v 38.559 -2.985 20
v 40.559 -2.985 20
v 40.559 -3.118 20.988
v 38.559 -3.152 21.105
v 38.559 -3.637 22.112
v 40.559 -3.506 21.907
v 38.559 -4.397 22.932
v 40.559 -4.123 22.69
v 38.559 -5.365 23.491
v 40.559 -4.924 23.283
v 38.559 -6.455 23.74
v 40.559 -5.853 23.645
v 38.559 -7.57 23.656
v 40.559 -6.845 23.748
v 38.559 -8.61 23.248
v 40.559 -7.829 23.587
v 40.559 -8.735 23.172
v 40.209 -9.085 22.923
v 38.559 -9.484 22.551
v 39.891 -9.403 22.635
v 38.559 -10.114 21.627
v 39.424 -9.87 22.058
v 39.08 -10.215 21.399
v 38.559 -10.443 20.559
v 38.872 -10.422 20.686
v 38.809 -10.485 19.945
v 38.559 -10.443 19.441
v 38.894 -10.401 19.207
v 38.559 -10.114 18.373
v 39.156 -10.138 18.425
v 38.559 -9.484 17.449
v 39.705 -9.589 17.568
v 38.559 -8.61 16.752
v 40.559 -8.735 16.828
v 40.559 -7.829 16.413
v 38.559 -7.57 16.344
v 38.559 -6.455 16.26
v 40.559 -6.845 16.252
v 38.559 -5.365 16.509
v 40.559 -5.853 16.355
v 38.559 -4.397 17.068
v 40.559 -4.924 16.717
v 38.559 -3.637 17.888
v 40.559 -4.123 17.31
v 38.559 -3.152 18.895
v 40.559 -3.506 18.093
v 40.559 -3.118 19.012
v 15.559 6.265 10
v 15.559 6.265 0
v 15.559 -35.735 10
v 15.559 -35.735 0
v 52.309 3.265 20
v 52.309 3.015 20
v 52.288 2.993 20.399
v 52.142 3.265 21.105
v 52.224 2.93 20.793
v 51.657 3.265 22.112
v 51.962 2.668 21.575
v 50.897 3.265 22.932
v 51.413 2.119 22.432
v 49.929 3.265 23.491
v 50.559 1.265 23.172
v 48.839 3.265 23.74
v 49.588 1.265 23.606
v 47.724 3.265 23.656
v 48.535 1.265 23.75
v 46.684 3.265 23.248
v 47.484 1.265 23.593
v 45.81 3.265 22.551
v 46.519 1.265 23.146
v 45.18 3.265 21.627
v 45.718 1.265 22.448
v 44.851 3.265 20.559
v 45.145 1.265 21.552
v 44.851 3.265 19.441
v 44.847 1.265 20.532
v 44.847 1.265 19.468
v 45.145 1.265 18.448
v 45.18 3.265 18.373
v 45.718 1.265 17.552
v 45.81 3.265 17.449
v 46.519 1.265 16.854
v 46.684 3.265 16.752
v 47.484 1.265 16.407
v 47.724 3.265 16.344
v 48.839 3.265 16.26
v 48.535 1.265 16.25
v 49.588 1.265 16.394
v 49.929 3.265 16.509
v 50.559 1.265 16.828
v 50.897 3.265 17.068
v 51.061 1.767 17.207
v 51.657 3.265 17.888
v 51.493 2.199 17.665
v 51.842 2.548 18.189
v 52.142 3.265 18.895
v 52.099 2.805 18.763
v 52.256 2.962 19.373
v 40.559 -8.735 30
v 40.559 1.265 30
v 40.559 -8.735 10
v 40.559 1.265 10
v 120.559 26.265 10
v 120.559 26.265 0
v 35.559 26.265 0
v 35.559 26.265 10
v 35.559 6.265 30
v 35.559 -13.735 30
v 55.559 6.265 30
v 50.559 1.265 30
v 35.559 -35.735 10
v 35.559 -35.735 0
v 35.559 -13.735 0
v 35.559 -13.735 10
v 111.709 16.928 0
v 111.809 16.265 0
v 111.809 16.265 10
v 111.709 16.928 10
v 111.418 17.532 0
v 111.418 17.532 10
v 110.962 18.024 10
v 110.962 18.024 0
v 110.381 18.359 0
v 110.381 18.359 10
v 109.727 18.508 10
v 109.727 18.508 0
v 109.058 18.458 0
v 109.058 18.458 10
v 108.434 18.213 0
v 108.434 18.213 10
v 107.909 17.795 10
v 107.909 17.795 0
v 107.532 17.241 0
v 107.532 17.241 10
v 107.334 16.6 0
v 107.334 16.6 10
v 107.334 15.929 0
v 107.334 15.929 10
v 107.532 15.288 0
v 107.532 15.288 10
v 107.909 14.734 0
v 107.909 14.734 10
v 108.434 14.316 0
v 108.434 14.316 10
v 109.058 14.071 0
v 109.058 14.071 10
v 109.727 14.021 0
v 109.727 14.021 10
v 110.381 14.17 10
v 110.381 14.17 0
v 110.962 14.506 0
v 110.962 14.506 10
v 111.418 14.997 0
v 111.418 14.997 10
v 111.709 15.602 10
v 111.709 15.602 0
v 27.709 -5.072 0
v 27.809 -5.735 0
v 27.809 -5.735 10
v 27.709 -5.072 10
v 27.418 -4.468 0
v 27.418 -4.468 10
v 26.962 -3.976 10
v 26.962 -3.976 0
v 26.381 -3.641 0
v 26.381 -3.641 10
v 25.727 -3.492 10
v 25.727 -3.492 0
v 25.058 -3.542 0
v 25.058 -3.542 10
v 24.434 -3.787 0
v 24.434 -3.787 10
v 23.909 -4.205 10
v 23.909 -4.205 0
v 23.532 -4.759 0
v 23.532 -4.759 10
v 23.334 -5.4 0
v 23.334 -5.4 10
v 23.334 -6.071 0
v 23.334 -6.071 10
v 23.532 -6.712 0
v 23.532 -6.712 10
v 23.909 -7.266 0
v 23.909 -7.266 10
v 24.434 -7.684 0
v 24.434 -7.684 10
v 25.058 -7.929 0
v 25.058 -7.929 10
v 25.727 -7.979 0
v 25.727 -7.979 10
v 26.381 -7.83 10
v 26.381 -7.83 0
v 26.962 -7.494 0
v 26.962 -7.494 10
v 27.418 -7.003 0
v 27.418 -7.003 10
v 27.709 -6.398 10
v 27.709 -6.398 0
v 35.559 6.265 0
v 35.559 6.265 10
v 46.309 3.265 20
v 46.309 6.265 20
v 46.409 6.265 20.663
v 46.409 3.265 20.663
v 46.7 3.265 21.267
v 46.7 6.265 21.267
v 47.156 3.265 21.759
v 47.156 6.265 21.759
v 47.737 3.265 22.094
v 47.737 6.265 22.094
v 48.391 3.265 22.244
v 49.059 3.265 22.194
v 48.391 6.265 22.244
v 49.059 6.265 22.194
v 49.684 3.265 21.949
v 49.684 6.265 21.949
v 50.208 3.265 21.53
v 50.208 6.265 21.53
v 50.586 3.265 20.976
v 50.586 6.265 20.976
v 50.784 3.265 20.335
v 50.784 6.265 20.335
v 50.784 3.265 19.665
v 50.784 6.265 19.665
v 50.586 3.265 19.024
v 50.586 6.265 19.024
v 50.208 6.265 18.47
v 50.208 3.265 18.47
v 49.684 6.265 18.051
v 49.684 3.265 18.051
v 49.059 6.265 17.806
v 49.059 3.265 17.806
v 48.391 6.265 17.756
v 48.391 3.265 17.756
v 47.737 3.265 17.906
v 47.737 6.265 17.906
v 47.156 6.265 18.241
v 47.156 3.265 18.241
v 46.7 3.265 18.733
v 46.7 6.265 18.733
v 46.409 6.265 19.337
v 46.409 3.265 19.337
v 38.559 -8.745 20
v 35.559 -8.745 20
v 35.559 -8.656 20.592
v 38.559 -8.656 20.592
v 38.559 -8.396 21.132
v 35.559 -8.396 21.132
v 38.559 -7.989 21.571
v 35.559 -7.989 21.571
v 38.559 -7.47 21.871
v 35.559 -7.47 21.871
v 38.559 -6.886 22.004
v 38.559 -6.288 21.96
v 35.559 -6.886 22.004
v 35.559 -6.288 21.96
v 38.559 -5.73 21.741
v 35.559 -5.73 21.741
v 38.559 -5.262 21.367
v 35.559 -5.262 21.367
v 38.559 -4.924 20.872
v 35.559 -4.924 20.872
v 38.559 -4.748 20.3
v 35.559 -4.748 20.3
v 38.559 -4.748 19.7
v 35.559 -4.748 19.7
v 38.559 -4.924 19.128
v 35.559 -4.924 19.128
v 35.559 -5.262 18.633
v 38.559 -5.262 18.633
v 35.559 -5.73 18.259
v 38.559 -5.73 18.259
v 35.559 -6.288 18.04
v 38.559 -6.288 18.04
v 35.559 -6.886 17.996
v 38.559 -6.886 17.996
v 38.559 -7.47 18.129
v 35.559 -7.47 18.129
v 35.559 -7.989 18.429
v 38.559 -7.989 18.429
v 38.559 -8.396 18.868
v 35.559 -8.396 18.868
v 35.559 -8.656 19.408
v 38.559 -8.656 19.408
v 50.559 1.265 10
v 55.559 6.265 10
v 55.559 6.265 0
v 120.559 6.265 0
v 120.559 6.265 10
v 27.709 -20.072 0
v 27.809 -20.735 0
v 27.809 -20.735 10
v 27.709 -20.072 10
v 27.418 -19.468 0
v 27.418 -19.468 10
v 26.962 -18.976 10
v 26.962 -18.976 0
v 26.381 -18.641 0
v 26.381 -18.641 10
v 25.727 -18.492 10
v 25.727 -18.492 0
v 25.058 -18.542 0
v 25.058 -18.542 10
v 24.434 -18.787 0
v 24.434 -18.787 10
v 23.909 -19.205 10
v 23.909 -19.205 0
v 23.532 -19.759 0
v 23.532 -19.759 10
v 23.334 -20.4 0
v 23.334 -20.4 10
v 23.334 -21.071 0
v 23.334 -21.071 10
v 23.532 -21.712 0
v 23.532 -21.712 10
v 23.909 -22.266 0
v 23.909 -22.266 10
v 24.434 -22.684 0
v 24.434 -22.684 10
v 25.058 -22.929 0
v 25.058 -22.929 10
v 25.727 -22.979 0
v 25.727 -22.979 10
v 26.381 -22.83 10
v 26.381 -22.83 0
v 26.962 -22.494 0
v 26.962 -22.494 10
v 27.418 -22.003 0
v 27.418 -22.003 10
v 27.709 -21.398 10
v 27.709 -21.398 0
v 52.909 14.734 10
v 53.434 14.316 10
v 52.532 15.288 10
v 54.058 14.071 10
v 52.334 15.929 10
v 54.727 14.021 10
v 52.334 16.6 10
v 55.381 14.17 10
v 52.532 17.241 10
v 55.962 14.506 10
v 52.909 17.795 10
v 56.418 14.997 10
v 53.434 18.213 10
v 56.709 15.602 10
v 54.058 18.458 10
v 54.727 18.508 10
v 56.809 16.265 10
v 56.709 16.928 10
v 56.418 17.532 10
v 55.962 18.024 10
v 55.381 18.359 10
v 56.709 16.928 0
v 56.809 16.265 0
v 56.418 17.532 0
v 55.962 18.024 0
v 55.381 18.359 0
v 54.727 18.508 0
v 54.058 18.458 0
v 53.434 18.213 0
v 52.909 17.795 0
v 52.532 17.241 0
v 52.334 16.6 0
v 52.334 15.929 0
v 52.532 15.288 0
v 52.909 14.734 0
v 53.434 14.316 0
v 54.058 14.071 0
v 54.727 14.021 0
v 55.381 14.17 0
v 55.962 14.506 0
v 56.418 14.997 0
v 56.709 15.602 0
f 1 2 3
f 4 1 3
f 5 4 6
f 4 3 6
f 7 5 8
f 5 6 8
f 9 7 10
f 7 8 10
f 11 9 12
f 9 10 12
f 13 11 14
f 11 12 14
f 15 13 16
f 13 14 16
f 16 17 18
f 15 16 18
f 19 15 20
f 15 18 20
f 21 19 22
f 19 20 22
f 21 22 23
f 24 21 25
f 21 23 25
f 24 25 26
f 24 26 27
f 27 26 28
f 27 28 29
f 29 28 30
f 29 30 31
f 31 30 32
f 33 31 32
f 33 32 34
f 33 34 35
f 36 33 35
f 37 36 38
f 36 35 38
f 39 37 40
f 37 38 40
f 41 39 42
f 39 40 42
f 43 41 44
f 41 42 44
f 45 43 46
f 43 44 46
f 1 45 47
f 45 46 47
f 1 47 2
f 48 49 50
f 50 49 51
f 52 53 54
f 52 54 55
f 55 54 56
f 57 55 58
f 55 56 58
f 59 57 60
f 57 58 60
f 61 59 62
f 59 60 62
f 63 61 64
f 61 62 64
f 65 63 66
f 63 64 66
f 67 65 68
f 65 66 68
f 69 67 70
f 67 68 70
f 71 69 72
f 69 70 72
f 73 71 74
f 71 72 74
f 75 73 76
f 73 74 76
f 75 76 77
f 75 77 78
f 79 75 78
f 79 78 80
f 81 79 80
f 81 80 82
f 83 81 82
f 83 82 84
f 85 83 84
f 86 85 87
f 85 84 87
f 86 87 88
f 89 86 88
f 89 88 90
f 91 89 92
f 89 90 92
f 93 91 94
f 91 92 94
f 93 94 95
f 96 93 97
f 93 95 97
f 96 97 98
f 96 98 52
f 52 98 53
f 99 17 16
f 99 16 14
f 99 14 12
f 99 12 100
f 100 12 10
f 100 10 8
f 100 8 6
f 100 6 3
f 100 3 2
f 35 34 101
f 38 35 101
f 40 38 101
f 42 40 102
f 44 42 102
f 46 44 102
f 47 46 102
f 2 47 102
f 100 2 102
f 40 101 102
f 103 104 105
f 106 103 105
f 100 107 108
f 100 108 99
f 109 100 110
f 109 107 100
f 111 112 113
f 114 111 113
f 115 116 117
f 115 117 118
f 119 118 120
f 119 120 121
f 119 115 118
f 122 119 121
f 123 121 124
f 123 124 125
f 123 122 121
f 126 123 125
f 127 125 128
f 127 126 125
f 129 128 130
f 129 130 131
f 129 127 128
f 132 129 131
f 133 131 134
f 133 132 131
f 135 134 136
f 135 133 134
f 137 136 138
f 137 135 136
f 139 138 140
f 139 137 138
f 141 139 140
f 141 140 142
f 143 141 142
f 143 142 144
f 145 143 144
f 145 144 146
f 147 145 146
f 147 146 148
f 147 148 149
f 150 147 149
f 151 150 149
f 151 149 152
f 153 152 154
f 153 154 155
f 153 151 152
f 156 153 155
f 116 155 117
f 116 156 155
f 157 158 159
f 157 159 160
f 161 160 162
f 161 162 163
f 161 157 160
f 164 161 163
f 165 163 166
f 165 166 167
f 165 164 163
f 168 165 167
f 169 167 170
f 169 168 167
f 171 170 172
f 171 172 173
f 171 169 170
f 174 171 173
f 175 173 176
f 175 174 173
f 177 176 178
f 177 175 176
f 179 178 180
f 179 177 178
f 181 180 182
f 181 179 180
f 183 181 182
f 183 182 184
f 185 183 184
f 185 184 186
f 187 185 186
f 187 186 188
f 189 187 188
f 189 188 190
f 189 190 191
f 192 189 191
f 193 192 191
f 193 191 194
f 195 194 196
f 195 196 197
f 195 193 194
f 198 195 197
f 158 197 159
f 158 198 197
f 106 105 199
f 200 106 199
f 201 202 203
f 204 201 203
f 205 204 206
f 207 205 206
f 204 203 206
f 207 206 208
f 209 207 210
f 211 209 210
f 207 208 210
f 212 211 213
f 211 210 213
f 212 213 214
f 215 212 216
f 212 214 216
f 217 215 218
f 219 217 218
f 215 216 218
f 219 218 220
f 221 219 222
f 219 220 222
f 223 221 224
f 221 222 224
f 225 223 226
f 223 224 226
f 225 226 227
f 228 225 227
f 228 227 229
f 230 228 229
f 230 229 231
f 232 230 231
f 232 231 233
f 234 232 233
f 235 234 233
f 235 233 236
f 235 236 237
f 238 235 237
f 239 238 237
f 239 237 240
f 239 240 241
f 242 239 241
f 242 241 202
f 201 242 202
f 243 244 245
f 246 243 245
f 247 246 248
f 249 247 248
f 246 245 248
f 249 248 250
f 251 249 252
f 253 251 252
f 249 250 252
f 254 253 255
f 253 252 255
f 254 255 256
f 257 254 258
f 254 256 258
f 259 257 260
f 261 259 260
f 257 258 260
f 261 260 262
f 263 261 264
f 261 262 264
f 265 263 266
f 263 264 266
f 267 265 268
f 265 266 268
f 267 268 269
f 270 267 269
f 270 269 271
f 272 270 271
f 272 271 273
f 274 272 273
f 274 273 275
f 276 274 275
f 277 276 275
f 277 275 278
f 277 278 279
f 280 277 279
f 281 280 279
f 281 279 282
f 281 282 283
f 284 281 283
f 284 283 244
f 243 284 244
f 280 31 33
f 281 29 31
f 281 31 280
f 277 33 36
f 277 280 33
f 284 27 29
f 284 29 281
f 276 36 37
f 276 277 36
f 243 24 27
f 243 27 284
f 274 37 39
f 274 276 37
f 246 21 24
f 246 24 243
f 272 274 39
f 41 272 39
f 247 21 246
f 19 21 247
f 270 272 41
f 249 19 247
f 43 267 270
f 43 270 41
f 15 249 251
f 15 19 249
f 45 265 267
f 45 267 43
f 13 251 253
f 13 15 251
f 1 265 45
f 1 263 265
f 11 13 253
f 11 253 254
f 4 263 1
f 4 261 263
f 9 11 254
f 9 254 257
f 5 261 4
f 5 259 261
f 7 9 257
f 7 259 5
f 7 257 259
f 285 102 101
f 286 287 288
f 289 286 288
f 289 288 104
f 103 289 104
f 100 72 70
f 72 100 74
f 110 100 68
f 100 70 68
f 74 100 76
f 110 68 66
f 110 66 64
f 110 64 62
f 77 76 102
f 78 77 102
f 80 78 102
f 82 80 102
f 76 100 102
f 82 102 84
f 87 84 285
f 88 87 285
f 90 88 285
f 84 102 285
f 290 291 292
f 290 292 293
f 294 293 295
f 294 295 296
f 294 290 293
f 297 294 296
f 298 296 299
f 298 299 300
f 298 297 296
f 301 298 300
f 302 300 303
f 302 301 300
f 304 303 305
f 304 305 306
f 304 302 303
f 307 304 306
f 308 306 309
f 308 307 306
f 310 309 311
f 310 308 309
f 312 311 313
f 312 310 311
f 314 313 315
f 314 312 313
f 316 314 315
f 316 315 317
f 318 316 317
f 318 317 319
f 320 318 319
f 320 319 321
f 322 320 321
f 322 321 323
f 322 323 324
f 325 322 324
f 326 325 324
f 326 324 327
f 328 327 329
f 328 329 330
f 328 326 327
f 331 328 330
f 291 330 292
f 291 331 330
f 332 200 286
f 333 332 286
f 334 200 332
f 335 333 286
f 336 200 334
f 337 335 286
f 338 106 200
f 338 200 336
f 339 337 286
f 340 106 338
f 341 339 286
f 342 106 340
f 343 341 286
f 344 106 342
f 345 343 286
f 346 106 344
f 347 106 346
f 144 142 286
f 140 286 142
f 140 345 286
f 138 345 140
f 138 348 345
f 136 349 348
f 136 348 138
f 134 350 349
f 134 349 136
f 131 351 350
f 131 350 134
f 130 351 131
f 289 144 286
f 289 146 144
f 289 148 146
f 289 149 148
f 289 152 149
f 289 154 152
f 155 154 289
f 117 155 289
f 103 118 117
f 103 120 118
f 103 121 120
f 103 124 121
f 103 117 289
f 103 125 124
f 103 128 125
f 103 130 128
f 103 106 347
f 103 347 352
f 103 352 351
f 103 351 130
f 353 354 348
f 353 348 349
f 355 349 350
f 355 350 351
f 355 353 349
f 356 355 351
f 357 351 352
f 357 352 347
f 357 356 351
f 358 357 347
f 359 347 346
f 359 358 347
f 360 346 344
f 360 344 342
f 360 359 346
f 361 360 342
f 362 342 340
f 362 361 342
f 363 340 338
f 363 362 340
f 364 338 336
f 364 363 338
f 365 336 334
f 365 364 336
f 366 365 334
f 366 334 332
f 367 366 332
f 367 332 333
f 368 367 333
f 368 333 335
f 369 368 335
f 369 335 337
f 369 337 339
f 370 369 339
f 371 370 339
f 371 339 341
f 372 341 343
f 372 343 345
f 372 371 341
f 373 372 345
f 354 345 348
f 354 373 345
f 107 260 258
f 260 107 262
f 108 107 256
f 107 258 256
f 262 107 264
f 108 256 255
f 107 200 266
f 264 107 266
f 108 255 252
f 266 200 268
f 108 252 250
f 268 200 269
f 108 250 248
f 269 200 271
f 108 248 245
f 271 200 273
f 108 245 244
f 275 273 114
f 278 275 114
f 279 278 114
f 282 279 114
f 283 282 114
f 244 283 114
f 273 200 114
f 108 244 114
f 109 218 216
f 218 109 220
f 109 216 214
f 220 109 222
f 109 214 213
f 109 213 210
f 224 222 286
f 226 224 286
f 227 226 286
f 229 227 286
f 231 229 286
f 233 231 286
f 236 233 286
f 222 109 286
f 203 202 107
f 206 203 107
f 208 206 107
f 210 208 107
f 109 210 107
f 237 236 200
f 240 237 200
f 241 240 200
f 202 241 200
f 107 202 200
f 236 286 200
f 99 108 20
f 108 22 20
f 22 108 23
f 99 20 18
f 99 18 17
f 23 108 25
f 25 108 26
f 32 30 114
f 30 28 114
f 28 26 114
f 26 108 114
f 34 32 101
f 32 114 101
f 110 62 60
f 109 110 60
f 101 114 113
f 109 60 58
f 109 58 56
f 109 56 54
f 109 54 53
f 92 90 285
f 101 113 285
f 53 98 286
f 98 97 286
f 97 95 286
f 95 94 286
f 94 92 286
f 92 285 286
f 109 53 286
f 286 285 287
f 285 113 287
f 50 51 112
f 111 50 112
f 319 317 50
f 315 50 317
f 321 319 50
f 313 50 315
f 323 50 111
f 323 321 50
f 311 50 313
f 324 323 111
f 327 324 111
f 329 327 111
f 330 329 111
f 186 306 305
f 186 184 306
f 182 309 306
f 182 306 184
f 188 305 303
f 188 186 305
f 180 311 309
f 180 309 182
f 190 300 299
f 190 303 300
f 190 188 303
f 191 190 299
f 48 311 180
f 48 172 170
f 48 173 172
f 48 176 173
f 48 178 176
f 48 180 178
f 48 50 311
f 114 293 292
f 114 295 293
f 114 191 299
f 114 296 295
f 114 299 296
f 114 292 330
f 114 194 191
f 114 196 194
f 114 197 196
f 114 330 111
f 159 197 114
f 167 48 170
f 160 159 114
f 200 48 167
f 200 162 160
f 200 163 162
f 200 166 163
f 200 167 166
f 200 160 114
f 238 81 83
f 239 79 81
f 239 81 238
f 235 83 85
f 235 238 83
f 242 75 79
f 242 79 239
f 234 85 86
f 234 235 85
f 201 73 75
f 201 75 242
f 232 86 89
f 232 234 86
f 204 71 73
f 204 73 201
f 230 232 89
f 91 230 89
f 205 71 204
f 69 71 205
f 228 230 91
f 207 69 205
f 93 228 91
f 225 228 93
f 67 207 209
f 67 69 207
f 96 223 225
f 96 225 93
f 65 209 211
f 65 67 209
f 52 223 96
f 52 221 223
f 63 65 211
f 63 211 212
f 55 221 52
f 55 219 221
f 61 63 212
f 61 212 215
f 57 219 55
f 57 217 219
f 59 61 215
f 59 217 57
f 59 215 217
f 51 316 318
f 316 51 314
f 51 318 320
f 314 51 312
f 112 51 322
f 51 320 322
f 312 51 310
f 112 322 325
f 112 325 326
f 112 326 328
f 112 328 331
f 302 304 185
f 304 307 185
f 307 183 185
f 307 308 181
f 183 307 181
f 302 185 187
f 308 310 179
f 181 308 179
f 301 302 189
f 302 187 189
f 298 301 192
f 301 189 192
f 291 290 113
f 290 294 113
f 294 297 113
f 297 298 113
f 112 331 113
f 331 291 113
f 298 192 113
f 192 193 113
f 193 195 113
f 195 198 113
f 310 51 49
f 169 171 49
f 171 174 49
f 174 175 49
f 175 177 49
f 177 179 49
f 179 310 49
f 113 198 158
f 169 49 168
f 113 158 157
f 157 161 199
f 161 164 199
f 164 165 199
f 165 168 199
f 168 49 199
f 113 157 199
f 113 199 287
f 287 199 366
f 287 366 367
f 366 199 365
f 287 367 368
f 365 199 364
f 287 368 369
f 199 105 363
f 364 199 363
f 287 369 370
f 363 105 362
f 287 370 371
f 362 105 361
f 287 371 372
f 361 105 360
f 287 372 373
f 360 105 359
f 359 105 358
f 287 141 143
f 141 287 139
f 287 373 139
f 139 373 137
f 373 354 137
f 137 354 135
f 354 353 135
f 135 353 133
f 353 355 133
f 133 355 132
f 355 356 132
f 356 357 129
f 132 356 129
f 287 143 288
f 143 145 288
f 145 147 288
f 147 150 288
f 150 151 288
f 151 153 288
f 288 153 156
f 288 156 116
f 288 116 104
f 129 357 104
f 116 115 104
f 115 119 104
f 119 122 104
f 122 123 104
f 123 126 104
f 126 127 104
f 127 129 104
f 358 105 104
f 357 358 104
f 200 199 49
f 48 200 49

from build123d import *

# Parameters (mm, degrees)
F0_R      = 2.25
F1_DEPTH  = 10
F3_DEPTH  = 20
F4_R      = 2.01
F5_DEPTH  = 5
F6_R      = 2.25
F7_DEPTH  = 5
F8_R      = 3.75
F9_DEPTH  = 2
F10_R     = 3.75
F11_DEPTH = 2


with BuildPart() as f1:
    # F0 (on Top) → F1 (new body)
    with BuildSketch(Plane.XY):
        Polygon((15.558824, 6.264706), (15.558824, -35.735294), (35.558824, -35.735294), (35.558824, -13.735294), (55.558824, 6.264706), (120.558824, 6.264706), (120.558824, 26.264706), (35.558824, 26.264706), (35.558824, 6.264706), align=None)
        with Locations((25.558824, -20.735294)):
            Circle(F0_R, mode=Mode.SUBTRACT)
        with Locations((25.558824, -5.735294)):
            Circle(F0_R, mode=Mode.SUBTRACT)
        with Locations((54.558824, 16.264706)):
            Circle(F0_R, mode=Mode.SUBTRACT)
        with Locations((109.558824, 16.264706)):
            Circle(F0_R, mode=Mode.SUBTRACT)
    extrude(amount=F1_DEPTH)

    # F2 (on face) → F3 (join)
    with BuildSketch(Plane.XY.offset(10)):
        Polygon((55.558824, 6.264706), (35.558824, 6.264706), (35.558824, -13.735294), (40.558824, -8.735294), (40.558824, 1.264706), (45.558824, 1.264706), (50.558824, 1.264706), align=None)
    extrude(amount=F3_DEPTH)

    # F4 (on face) → F5 (cut)
    with BuildSketch(Plane(origin=(35.558824, 0, 0), x_dir=(0, -1, 0), z_dir=(-1, 0, 0))):
        with Locations((6.735294, 20)):
            Circle(F4_R)
    extrude(amount=-F5_DEPTH, mode=Mode.SUBTRACT)

    # F6 (on face) → F7 (cut)
    with BuildSketch(Plane(origin=(0, 6.264706, 0), x_dir=(-1, 0, 0), z_dir=(0, 1, 0))):
        with Locations((-48.558824, 20)):
            Circle(F6_R)
    extrude(amount=-F7_DEPTH, mode=Mode.SUBTRACT)

    # F8 (on face) → F9 (cut)
    with BuildSketch(Plane.XZ.offset(-1.264706)):
        with Locations((48.558824, 20)):
            Circle(F8_R)
    extrude(amount=-F9_DEPTH, mode=Mode.SUBTRACT)

    # F10 (on face) → F11 (cut)
    with BuildSketch(Plane.YZ.offset(40.558824)):
        with Locations((-6.735294, 20)):
            Circle(F10_R)
    extrude(amount=-F11_DEPTH, mode=Mode.SUBTRACT)


solid = f1.part
